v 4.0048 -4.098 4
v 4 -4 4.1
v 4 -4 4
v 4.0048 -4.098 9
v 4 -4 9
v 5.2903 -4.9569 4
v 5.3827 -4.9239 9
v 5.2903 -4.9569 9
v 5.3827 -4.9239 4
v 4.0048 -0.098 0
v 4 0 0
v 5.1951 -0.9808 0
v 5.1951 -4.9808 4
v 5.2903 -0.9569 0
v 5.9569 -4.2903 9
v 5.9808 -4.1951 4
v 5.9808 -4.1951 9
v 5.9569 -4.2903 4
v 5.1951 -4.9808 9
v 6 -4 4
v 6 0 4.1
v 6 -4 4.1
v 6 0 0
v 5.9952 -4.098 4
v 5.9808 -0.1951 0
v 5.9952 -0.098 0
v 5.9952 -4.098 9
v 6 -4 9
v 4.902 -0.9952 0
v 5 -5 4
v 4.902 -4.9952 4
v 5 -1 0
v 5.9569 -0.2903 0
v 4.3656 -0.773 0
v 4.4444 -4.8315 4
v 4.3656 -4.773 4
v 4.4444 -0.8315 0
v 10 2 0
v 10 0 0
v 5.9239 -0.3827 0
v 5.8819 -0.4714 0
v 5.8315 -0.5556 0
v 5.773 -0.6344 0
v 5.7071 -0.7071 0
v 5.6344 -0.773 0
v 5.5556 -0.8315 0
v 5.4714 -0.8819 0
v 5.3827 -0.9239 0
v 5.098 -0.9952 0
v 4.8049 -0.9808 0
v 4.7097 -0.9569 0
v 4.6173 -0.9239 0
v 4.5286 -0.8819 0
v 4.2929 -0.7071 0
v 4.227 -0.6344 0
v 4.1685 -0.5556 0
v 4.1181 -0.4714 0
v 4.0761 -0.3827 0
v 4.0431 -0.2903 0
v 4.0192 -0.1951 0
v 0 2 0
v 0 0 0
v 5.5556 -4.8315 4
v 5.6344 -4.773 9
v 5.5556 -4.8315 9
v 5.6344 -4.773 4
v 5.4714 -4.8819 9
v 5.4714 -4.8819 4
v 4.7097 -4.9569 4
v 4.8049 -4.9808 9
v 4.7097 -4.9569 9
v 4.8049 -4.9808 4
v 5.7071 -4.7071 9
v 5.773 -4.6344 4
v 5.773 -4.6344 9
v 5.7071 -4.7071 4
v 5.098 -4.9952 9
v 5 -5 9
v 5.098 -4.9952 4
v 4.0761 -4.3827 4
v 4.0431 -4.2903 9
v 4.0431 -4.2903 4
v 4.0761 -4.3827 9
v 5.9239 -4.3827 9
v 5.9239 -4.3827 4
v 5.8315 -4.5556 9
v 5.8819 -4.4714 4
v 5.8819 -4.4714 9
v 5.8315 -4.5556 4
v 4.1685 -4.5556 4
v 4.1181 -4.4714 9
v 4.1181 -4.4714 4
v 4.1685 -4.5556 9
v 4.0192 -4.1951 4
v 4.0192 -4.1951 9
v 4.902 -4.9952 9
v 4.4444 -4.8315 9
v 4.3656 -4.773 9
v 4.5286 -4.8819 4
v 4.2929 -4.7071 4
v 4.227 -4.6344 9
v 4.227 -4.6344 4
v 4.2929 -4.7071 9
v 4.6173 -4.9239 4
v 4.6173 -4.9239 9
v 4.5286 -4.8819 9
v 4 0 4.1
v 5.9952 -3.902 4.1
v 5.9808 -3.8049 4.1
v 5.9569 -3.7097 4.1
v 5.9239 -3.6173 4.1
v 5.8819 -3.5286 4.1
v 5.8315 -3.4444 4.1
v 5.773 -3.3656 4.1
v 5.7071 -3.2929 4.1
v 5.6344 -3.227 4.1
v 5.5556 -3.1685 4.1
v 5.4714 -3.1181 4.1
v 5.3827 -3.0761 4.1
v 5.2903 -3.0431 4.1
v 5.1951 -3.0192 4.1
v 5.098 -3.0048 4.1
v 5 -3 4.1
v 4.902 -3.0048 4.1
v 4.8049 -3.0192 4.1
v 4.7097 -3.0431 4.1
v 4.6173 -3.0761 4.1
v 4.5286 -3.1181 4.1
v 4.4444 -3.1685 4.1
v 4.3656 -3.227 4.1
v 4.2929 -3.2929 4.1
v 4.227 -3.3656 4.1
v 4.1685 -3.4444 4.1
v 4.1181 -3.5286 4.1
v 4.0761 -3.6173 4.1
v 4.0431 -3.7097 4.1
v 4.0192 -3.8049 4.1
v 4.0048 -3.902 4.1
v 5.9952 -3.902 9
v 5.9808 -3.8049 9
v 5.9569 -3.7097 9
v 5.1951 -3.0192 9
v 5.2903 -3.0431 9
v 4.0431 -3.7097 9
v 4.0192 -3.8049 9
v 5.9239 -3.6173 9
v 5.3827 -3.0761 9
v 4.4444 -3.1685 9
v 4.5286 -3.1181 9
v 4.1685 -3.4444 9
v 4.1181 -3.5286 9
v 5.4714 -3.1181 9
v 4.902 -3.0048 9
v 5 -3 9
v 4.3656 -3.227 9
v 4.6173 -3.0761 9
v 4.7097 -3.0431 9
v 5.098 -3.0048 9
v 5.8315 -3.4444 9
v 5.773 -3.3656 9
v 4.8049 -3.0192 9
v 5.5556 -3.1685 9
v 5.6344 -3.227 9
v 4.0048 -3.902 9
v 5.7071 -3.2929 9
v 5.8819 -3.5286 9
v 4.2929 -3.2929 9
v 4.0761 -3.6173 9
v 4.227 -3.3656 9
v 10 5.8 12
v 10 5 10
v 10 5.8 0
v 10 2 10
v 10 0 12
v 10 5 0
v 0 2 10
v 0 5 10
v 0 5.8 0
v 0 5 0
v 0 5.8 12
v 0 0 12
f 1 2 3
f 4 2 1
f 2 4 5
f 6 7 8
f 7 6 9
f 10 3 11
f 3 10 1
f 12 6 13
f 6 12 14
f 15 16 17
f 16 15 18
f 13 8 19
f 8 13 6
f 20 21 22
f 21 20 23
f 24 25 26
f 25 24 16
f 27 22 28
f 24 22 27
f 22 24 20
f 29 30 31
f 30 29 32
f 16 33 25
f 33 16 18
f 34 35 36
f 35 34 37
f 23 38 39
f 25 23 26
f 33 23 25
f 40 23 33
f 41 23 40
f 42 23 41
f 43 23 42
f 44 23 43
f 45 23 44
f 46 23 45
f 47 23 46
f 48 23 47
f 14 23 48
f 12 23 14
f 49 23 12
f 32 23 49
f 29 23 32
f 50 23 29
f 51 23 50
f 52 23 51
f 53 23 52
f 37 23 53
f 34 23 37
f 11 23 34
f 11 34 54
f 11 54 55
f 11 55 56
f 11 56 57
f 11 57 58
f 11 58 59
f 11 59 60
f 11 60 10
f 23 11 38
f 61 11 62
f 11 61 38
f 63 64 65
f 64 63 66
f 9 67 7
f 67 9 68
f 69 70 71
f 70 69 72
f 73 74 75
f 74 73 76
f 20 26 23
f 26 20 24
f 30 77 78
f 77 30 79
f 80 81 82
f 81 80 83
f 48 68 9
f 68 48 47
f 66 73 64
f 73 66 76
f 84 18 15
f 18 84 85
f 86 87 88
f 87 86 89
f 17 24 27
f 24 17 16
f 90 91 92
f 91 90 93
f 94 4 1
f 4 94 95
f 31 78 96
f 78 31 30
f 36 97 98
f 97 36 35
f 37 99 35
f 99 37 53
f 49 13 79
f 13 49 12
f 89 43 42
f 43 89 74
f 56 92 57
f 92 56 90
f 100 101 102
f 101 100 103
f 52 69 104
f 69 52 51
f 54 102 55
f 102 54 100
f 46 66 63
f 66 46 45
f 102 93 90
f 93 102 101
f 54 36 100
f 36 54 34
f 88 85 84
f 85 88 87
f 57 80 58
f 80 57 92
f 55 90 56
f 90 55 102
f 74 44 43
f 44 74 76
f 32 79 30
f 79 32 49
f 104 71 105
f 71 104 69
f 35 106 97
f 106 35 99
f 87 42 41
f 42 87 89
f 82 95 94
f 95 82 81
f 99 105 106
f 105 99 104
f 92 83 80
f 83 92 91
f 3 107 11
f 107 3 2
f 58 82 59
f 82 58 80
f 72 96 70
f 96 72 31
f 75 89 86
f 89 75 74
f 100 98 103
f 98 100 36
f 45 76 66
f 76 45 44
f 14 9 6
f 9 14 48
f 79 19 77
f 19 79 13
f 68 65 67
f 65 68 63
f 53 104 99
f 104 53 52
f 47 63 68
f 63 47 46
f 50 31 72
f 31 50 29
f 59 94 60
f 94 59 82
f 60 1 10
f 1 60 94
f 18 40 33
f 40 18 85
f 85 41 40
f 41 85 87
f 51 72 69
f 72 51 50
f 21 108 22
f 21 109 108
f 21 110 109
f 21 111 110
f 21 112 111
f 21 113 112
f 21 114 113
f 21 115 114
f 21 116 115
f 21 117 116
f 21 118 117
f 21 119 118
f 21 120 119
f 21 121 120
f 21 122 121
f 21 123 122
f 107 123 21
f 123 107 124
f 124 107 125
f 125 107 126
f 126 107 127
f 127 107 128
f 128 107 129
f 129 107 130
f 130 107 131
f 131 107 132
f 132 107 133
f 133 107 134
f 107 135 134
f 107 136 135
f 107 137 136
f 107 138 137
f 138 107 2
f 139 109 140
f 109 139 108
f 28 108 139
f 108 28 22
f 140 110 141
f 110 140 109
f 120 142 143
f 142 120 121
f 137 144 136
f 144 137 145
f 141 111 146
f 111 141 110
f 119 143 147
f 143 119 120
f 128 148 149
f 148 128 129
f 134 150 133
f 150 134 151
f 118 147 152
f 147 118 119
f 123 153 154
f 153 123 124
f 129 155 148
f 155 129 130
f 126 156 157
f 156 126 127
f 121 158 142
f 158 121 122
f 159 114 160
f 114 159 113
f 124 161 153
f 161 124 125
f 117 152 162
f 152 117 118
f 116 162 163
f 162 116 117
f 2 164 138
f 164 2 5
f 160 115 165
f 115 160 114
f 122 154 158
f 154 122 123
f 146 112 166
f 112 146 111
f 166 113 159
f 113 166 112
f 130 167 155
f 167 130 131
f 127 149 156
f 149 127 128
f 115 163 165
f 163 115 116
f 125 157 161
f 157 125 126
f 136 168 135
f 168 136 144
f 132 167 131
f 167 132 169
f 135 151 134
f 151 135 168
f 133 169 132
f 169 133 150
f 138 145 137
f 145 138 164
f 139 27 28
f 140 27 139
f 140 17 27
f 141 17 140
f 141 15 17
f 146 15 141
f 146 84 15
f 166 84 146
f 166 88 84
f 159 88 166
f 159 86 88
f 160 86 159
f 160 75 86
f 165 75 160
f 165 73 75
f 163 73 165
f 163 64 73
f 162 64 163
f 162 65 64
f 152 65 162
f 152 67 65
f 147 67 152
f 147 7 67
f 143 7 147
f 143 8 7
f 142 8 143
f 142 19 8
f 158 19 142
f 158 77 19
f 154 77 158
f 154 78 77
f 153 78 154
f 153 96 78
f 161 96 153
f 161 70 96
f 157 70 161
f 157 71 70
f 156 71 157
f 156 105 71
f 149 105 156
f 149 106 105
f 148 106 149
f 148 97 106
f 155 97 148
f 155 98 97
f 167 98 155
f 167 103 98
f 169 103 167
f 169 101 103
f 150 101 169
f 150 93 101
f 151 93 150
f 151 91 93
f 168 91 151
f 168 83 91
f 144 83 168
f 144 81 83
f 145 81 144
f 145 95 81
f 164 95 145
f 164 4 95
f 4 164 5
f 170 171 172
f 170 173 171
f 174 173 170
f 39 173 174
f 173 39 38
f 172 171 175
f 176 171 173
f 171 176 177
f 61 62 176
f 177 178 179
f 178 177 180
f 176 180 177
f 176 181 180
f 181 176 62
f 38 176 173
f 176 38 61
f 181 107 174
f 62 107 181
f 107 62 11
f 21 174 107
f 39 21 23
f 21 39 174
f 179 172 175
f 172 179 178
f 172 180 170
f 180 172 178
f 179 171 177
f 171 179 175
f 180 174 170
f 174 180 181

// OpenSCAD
innerThickness = 0.8;
frameThickness = 3;
regularThickness = 2;

frameHeight = 10;

hookLength = 3;
hookHeight = 5;
hookWidth = 2;
totalWidth = 10;

hookDisplacement = hookLength + hookWidth / 2;

$fn = $preview ? 16: 64;

module hook() {
    hull() {
        cylinder(0.1, d = hookWidth);
        
        translate([0, -hookDisplacement, hookDisplacement])
        cylinder(0.1, d = hookWidth);
        
        translate([0, 0, hookDisplacement / 2 + 0.1])
        cube([hookWidth, 0.1, hookDisplacement], center = true);
    }
    
    translate([0, -hookDisplacement, hookDisplacement])
    cylinder(hookHeight, d = hookWidth);
}

cube([totalWidth, regularThickness, frameHeight]);

translate([0, regularThickness + frameThickness, 0])
cube([totalWidth, innerThickness, frameHeight]);

translate([0, 0, frameHeight])
cube([totalWidth, regularThickness + frameThickness + innerThickness, regularThickness]);

translate([totalWidth / 2, 0, 0])
hook();
